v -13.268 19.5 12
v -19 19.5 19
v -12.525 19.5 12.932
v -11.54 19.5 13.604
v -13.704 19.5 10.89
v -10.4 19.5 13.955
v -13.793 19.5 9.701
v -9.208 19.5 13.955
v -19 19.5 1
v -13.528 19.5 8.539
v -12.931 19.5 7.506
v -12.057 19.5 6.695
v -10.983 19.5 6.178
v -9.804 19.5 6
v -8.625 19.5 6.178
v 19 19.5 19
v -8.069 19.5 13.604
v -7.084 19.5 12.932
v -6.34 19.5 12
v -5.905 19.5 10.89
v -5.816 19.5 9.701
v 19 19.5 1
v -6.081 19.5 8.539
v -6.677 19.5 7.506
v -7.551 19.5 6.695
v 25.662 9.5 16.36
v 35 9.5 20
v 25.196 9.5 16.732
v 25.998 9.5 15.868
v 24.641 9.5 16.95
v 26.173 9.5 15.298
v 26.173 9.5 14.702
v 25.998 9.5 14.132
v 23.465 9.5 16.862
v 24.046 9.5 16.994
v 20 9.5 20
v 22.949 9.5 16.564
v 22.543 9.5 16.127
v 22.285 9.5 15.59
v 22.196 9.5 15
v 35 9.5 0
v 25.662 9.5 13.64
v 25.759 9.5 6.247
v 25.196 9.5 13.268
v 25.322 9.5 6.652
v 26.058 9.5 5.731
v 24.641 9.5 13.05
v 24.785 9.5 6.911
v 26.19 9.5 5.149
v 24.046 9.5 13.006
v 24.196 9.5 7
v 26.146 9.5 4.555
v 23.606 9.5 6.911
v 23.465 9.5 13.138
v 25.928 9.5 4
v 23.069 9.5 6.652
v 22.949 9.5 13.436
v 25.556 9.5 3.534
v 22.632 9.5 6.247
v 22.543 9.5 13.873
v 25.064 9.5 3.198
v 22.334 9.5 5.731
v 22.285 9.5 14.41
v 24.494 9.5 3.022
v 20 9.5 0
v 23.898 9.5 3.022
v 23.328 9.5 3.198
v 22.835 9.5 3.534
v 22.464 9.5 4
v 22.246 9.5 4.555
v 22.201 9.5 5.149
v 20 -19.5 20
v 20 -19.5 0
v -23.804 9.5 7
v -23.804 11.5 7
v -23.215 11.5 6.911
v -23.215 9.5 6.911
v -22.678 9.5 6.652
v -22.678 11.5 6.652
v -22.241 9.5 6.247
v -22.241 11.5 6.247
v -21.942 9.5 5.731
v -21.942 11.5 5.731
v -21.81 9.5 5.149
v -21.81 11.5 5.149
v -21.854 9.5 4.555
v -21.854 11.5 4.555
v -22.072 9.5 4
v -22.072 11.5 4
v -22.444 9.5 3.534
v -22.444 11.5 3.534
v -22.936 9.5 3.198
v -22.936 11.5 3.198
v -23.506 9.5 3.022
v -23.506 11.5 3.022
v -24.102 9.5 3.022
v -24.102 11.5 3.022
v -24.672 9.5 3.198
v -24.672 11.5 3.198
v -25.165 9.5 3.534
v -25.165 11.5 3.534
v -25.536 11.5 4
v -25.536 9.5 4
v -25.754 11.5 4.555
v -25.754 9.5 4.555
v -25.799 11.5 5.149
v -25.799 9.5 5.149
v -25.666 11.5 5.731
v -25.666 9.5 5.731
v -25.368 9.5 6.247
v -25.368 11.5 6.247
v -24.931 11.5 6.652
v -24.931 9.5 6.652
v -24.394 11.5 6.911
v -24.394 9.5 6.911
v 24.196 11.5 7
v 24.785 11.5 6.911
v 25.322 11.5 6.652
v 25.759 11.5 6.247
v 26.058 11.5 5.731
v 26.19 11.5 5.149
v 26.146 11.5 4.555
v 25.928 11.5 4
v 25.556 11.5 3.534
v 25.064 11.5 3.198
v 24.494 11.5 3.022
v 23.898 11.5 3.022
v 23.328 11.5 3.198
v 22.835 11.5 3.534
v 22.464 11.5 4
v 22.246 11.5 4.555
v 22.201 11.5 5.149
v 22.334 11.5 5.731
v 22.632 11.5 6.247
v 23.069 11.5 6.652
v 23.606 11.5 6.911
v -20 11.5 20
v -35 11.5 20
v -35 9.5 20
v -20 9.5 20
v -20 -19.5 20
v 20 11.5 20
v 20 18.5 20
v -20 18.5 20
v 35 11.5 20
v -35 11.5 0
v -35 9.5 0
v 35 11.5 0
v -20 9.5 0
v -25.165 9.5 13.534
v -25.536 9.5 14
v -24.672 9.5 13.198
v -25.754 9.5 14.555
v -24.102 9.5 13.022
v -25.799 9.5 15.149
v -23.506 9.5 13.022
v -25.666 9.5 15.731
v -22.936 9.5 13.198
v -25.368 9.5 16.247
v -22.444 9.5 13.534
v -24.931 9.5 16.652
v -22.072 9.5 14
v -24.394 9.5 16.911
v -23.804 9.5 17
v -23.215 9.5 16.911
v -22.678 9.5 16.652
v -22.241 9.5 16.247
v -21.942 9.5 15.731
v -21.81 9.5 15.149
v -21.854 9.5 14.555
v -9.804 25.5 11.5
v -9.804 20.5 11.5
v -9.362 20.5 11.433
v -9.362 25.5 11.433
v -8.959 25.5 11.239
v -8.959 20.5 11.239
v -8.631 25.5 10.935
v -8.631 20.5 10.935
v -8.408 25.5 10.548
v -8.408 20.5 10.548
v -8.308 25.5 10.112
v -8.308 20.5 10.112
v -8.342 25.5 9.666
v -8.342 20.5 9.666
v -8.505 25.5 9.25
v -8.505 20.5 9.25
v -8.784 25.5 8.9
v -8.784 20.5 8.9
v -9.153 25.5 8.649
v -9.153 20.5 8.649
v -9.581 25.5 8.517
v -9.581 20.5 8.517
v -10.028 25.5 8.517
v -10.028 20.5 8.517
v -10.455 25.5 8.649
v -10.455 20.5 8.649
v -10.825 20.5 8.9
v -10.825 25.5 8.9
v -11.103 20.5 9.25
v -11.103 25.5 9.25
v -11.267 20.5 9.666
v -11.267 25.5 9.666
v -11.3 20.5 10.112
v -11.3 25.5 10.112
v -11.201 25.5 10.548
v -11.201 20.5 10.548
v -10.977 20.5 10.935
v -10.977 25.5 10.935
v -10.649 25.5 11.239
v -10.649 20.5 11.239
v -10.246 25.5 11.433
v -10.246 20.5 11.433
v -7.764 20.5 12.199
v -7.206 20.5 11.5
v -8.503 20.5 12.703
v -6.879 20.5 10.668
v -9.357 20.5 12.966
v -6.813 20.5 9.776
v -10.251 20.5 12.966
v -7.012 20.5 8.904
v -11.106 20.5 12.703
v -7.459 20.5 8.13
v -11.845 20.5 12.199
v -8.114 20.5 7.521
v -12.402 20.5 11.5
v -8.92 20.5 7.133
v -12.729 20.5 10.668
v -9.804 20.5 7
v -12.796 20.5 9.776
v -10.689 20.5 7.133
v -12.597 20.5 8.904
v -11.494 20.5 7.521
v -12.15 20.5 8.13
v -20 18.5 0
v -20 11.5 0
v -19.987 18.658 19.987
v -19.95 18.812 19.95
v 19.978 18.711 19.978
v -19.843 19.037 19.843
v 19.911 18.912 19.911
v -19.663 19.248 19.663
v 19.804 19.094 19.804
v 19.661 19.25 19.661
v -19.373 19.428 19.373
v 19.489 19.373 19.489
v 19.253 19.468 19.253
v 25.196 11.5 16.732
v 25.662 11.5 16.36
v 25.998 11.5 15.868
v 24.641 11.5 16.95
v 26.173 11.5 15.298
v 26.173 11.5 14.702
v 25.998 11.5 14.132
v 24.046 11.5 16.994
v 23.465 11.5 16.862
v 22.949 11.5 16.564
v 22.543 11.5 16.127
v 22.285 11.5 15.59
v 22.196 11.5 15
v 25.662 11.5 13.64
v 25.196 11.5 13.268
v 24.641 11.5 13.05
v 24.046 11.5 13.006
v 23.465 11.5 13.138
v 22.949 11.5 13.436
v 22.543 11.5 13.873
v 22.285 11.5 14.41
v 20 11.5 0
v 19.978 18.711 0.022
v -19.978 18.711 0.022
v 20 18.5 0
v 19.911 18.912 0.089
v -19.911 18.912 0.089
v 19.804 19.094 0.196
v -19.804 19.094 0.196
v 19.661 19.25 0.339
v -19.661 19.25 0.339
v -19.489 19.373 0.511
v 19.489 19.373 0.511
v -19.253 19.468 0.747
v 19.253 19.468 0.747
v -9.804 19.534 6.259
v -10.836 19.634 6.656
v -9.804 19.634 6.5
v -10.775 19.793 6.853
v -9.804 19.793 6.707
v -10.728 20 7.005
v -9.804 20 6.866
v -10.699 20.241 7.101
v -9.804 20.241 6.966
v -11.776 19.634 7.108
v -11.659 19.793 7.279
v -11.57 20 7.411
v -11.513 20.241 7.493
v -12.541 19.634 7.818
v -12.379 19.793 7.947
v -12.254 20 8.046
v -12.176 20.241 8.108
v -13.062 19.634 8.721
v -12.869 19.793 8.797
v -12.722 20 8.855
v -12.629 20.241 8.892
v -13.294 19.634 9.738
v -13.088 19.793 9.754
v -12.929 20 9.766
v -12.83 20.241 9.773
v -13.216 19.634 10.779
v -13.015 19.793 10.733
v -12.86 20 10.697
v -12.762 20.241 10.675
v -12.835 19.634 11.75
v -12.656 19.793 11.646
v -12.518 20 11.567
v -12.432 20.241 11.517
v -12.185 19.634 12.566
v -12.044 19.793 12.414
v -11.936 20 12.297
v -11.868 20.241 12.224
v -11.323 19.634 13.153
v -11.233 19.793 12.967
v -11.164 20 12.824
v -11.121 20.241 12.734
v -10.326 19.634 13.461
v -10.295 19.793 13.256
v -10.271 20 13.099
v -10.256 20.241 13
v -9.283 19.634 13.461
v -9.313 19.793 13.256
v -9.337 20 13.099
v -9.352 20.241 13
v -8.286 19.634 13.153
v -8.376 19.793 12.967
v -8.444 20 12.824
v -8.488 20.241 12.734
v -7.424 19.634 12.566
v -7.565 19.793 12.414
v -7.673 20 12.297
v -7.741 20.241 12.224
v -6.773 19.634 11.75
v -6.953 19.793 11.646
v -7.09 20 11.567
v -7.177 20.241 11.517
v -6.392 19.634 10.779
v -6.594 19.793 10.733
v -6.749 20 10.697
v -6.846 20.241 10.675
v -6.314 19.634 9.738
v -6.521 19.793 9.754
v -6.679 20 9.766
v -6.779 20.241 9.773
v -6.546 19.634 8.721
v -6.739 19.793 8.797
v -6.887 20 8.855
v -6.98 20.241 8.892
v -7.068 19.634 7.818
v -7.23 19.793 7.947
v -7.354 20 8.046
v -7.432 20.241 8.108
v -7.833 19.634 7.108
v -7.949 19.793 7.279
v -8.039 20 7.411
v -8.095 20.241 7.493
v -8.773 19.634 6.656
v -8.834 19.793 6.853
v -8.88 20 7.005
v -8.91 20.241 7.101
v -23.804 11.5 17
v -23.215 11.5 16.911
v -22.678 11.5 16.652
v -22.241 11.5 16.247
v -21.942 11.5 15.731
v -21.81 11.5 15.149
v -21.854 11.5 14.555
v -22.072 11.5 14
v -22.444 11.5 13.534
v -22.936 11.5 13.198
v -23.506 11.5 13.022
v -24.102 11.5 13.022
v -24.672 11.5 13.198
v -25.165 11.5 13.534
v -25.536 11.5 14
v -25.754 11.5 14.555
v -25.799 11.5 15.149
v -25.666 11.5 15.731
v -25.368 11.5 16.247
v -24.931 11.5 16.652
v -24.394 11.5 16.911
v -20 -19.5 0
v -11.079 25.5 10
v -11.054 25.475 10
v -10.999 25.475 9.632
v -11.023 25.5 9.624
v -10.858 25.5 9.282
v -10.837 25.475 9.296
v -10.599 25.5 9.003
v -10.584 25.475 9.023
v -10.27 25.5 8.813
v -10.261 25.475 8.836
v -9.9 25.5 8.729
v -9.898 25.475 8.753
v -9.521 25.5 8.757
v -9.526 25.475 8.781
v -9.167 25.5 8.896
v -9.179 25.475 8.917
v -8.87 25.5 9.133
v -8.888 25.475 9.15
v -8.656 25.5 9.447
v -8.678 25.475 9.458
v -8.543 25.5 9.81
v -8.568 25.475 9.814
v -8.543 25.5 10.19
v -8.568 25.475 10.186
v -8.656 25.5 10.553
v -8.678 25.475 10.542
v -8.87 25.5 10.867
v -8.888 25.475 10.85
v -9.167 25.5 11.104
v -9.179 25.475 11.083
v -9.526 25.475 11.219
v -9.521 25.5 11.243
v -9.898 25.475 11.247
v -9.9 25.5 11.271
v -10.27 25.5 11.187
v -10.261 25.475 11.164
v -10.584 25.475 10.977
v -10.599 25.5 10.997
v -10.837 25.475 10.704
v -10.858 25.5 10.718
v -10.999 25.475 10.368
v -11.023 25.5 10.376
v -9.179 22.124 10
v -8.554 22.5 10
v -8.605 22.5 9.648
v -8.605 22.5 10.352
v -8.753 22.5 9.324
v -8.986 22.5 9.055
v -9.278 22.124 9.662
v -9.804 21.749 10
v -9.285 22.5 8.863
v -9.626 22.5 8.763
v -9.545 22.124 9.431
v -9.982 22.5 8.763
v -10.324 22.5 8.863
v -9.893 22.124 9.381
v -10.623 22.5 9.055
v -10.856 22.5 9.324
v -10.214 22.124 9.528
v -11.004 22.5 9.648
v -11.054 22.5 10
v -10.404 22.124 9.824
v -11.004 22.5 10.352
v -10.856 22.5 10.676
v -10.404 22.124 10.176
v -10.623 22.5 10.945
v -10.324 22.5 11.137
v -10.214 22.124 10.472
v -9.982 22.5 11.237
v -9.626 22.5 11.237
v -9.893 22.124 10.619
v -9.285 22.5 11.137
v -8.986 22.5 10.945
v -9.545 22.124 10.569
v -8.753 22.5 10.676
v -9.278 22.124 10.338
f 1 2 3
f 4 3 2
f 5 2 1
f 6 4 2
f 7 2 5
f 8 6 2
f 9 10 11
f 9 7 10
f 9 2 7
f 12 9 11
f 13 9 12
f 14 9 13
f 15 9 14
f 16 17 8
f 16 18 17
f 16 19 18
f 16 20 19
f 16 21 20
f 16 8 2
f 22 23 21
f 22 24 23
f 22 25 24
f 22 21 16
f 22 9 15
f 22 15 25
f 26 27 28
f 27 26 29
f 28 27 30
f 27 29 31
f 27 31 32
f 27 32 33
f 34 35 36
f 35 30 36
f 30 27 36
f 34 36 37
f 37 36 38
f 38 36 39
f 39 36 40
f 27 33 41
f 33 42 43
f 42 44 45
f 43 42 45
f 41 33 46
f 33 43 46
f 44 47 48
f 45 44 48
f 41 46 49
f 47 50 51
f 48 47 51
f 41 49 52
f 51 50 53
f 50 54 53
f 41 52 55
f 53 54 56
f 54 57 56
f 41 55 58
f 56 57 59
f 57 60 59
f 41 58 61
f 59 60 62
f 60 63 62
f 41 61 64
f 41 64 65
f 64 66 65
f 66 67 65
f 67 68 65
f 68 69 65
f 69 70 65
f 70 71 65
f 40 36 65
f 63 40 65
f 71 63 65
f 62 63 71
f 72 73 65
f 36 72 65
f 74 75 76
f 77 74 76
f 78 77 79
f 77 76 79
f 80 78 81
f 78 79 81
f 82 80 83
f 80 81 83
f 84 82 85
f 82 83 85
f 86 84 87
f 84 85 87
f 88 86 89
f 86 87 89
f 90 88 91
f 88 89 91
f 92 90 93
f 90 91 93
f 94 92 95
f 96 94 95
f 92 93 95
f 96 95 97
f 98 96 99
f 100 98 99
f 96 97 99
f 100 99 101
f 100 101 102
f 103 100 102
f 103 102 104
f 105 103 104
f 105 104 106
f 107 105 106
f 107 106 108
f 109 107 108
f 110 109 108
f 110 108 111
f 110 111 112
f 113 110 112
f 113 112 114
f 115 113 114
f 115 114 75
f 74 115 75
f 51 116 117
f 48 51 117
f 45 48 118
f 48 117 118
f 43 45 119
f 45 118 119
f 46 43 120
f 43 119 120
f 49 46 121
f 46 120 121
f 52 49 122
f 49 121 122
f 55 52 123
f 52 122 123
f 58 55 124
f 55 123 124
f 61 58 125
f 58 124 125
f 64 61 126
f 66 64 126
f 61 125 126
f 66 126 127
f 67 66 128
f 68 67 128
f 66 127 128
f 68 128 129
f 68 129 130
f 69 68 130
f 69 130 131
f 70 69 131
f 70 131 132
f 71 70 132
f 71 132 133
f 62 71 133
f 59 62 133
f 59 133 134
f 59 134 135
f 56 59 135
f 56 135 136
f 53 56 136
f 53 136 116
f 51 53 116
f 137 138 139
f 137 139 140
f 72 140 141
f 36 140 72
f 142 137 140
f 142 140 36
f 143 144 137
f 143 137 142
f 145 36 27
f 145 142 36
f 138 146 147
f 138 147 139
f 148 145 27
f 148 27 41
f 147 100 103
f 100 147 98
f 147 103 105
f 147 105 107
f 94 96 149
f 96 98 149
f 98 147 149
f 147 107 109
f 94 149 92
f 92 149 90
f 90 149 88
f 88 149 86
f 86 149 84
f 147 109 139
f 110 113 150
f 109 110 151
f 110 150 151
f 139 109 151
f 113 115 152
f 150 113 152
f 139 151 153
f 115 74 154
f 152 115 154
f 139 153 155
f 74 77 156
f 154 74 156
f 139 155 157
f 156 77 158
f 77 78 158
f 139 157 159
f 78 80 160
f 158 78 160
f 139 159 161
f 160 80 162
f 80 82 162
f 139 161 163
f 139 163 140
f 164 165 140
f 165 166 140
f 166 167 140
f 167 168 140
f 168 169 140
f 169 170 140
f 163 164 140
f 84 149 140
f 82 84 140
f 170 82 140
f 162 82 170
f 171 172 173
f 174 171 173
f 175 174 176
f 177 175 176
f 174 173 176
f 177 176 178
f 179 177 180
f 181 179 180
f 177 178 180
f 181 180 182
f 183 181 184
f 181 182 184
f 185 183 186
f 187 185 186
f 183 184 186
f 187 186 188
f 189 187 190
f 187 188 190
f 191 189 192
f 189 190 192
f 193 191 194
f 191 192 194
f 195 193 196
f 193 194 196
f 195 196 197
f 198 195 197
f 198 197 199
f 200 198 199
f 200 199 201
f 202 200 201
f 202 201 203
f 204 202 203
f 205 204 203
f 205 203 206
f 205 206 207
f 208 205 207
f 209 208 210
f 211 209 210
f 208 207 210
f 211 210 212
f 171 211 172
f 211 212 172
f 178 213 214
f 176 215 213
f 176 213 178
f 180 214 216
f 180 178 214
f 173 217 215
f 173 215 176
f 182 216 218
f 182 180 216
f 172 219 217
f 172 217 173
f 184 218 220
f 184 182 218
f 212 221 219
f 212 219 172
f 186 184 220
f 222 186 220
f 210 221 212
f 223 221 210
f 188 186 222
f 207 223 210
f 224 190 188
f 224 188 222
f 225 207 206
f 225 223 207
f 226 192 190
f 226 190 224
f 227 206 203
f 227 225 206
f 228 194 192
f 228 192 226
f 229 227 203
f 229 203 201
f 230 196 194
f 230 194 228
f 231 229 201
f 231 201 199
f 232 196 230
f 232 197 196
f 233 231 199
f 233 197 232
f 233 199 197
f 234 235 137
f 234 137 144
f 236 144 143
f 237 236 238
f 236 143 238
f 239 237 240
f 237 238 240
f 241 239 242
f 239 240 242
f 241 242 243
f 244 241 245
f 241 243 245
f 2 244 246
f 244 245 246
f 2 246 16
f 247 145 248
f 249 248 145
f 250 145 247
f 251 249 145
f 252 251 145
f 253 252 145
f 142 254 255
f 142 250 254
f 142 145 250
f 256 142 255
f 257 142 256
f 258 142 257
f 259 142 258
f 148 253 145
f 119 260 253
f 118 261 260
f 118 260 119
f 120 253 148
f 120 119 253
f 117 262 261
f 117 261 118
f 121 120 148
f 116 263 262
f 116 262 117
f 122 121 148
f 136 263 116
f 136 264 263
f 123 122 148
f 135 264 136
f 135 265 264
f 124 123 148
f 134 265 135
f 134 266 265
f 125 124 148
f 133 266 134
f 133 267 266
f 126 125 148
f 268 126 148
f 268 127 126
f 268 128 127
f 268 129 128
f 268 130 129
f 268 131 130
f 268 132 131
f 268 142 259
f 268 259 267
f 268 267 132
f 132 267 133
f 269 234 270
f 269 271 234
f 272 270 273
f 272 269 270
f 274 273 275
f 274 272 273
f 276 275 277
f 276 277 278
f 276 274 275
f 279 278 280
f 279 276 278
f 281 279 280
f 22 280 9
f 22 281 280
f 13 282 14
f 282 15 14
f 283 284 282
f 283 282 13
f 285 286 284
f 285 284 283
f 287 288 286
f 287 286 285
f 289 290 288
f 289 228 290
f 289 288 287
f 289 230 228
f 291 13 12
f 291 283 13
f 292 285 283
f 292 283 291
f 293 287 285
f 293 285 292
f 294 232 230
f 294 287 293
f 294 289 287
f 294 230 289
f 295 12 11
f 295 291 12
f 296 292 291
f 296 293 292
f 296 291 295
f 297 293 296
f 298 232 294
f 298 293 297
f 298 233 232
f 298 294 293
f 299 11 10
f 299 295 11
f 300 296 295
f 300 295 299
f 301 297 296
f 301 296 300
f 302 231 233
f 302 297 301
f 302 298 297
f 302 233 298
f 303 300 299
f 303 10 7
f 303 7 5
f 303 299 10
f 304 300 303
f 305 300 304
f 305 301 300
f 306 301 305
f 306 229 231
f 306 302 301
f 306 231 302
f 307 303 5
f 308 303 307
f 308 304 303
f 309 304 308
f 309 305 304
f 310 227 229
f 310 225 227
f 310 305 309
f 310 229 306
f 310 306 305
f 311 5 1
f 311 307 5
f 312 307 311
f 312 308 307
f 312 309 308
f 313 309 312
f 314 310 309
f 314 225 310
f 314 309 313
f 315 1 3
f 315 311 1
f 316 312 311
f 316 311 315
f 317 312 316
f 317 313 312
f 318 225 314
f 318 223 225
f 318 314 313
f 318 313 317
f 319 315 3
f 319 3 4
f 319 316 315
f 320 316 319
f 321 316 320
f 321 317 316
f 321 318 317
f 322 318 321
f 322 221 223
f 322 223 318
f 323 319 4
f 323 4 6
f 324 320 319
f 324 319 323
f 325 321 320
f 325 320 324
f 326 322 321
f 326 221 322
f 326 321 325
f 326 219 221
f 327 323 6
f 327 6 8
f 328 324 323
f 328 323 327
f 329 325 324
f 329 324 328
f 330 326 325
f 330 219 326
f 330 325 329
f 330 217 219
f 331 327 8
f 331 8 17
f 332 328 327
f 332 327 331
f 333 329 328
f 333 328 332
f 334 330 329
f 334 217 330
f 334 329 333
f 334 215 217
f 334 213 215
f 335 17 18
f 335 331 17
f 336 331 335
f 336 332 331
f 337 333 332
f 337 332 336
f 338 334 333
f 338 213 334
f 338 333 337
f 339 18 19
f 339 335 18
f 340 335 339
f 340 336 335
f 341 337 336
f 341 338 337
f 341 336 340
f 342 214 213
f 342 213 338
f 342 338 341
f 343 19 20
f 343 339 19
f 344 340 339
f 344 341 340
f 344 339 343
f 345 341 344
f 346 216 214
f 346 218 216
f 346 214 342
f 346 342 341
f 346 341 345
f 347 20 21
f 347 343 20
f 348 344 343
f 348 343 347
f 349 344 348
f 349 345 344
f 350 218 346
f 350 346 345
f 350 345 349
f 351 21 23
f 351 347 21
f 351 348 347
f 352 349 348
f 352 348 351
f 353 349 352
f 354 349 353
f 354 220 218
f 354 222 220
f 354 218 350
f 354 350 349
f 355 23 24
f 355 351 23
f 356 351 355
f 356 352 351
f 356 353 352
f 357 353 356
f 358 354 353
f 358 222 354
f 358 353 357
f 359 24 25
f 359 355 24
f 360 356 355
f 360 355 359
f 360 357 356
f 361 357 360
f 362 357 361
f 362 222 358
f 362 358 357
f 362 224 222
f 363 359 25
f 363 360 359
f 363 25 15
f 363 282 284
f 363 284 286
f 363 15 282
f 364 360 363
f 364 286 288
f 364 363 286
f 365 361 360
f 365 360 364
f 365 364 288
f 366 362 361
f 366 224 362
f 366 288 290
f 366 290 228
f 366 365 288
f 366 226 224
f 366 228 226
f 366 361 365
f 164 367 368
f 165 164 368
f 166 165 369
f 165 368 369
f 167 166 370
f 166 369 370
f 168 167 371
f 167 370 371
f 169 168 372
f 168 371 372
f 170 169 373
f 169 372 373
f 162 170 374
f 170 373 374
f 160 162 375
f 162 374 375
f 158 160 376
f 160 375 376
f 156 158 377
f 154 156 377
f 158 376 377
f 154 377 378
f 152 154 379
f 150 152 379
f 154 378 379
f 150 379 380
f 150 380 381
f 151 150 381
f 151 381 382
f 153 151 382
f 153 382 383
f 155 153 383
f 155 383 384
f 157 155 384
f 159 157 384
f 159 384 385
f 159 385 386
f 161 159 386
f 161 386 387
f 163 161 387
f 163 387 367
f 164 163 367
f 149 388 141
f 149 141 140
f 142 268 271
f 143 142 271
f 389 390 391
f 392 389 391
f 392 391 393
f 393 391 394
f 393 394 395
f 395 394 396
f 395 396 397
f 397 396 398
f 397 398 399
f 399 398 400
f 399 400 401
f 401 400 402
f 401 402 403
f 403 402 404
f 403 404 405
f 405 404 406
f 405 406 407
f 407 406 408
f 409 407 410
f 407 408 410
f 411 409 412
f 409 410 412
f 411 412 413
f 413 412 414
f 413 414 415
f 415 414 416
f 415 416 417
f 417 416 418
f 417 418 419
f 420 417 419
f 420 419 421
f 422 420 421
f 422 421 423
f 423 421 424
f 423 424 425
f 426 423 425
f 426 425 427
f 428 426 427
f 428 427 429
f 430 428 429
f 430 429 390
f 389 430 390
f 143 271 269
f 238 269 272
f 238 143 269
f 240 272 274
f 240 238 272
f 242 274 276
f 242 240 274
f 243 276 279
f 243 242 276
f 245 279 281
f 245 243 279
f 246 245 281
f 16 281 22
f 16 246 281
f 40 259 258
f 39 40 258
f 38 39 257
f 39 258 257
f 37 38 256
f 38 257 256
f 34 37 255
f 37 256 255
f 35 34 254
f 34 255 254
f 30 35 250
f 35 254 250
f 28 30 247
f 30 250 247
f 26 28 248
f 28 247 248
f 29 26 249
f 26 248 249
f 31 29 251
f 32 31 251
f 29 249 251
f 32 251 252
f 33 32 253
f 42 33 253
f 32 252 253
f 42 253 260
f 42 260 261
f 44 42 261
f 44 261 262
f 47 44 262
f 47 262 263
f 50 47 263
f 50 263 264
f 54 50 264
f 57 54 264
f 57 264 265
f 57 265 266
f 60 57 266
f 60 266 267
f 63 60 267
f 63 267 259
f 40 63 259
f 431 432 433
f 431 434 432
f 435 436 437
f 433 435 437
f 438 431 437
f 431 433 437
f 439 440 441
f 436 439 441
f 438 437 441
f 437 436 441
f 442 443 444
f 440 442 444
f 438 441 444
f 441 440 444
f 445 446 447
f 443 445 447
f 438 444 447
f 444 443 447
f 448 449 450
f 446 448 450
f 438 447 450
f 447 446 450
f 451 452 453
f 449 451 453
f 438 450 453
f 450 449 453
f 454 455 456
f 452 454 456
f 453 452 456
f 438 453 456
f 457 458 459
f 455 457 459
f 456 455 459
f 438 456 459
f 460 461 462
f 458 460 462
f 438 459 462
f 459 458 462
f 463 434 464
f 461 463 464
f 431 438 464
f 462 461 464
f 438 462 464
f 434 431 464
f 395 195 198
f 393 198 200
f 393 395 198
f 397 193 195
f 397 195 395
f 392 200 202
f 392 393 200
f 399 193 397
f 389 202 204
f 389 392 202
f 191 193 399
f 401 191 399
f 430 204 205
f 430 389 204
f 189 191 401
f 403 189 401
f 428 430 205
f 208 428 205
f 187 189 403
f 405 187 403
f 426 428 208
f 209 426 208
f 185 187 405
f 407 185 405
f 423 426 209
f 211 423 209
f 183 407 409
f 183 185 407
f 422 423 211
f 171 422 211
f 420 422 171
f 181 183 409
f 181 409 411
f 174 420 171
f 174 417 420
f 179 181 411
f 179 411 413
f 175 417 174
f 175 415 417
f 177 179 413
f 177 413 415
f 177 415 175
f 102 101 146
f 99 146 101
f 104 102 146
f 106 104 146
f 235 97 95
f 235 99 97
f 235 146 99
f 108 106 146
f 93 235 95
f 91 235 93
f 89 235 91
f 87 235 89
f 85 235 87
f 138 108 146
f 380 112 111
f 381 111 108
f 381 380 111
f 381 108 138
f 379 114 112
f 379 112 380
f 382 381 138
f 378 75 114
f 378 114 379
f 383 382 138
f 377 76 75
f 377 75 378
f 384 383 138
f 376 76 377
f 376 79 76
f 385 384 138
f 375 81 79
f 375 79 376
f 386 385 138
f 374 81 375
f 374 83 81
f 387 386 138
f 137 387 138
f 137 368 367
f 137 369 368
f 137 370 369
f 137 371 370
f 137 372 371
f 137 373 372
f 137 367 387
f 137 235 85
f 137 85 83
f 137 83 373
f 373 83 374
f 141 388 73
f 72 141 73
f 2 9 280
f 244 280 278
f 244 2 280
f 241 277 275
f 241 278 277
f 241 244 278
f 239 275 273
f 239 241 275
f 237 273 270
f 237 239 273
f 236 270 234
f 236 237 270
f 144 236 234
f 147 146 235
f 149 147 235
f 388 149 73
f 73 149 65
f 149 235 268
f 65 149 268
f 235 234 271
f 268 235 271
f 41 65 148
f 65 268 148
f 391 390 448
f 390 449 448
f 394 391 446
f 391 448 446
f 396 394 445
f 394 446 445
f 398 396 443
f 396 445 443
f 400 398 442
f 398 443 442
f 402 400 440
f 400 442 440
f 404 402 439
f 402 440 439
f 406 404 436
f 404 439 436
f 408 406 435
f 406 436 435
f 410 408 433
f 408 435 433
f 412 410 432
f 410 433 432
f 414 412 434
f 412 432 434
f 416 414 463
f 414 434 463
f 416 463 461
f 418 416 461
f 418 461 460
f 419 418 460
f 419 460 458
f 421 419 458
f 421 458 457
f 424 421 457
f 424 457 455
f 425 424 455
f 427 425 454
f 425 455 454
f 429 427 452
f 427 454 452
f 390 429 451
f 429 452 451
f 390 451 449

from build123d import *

# Parameters (mm, degrees)
SKETCH_1_W                   = 40
SKETCH_1_H                   = 39
EXTRUDE_1_DEPTH              = 20
SKETCH_2_W                   = 20
SKETCH_2_H                   = 2
EXTRUDE_2_DEPTH              = 15
SKETCH_6_W                   = 20
SKETCH_6_H                   = 2
EXTRUDE_3_DEPTH              = 15
SKETCH_8_R                   = 2
CUT_EXTRUDE_1_DEPTH          = 6
SKETCH_11_R                  = 3
EXTRUDE_5_DEPTH              = 1
SKETCH_16_R                  = 1.5
EXTRUDE_7_DEPTH              = 5
HOLE_WIZARD_M3_3_D           = 2.5
HOLE_WIZARD_M3_3_DEPTH       = 3
HOLE_WIZARD_M3_3_CSINK_D     = 2.55
HOLE_WIZARD_M3_3_CSINK_ANGLE = 90
HOLE_WIZARD_M3_3_TIP         = 0.751075774
FILLET_4_R                   = 1


with BuildPart() as part:
    # 草图1 → 凸台-拉伸1 (new body)
    with BuildSketch(Plane.XY):
        Rectangle(SKETCH_1_W, SKETCH_1_H)
    extrude(amount=EXTRUDE_1_DEPTH)

    # 草图2 → 凸台-拉伸2 (add)
    with BuildSketch(Plane.ZY.offset(20)):
        with Locations((10, 10.5)):
            Rectangle(SKETCH_2_W, SKETCH_2_H)
    extrude(amount=EXTRUDE_2_DEPTH)

    # 草图6 → 凸台-拉伸3 (add)
    with BuildSketch(Plane(origin=(20, 0, 0), x_dir=(0, 0, -1), z_dir=(1, 0, 0))):
        with Locations((-10, 10.5)):
            Rectangle(SKETCH_6_W, SKETCH_6_H)
    extrude(amount=EXTRUDE_3_DEPTH)

    # 草图8 → 切除-拉伸1 (cut)
    with BuildSketch(Plane(origin=(0, 11.5, 0), x_dir=(1, 0, 0), z_dir=(0, 1, 0))):
        with Locations(Location((-23.804244171, -5, 0), (0, 0, 270))):
            Circle(SKETCH_8_R)
        with Locations(Location((-23.804244171, -15, 0), (0, 0, 270))):
            Circle(SKETCH_8_R)
        with Locations(Location((24.195755829, -5, 0), (0, 0, 270))):
            Circle(SKETCH_8_R)
        with Locations(Location((24.195755829, -15, 0), (0, 0, 180))):
            Circle(SKETCH_8_R)
    extrude(amount=-CUT_EXTRUDE_1_DEPTH, mode=Mode.SUBTRACT)

    # 草图11 → 凸台-拉伸5 (add)
    with BuildSketch(Plane(origin=(0, 19.5, 0), x_dir=(1, 0, 0), z_dir=(0, 1, 0))):
        with Locations(Location((-9.804244171, -10, 0), (0, 0, 90))):
            Circle(SKETCH_11_R)
    extrude(amount=EXTRUDE_5_DEPTH)

    # 草图16 → 凸台-拉伸7 (add)
    with BuildSketch(Plane(origin=(0, 20.5, 0), x_dir=(1, 0, 0), z_dir=(0, 1, 0))):
        with Locations(Location((-9.804244171, -10, 0), (0, 0, 270))):
            Circle(SKETCH_16_R)
    extrude(amount=EXTRUDE_7_DEPTH)

    # M3 螺纹孔的螺纹孔钻头3
    with Locations(Plane(origin=(0, 25.5, 0), x_dir=(1, 0, 0), z_dir=(0, 1, 0))):
        with Locations((-9.804244171, -10)):
            CounterSinkHole(HOLE_WIZARD_M3_3_D / 2, HOLE_WIZARD_M3_3_CSINK_D / 2, depth=HOLE_WIZARD_M3_3_DEPTH, counter_sink_angle=HOLE_WIZARD_M3_3_CSINK_ANGLE)
            with Locations((0, 0, -(HOLE_WIZARD_M3_3_DEPTH + HOLE_WIZARD_M3_3_TIP / 2))):  # 118° drill point
                Cone(0, HOLE_WIZARD_M3_3_D / 2, HOLE_WIZARD_M3_3_TIP, mode=Mode.SUBTRACT)

    # 圆角4
    fillet_4_edges = [part.edges().sort_by_distance(p)[0] for p in [
        (0, 19.5, 0),
        (-9.804244171, 19.5, 13),
        (-20, 19.5, 10),
        (20, 19.5, 10),
        (0, 19.5, 20),
    ]]
    fillet(fillet_4_edges, radius=FILLET_4_R - 0.0001)  # a hair under: the kernel refuses the full size


solid = part.part
